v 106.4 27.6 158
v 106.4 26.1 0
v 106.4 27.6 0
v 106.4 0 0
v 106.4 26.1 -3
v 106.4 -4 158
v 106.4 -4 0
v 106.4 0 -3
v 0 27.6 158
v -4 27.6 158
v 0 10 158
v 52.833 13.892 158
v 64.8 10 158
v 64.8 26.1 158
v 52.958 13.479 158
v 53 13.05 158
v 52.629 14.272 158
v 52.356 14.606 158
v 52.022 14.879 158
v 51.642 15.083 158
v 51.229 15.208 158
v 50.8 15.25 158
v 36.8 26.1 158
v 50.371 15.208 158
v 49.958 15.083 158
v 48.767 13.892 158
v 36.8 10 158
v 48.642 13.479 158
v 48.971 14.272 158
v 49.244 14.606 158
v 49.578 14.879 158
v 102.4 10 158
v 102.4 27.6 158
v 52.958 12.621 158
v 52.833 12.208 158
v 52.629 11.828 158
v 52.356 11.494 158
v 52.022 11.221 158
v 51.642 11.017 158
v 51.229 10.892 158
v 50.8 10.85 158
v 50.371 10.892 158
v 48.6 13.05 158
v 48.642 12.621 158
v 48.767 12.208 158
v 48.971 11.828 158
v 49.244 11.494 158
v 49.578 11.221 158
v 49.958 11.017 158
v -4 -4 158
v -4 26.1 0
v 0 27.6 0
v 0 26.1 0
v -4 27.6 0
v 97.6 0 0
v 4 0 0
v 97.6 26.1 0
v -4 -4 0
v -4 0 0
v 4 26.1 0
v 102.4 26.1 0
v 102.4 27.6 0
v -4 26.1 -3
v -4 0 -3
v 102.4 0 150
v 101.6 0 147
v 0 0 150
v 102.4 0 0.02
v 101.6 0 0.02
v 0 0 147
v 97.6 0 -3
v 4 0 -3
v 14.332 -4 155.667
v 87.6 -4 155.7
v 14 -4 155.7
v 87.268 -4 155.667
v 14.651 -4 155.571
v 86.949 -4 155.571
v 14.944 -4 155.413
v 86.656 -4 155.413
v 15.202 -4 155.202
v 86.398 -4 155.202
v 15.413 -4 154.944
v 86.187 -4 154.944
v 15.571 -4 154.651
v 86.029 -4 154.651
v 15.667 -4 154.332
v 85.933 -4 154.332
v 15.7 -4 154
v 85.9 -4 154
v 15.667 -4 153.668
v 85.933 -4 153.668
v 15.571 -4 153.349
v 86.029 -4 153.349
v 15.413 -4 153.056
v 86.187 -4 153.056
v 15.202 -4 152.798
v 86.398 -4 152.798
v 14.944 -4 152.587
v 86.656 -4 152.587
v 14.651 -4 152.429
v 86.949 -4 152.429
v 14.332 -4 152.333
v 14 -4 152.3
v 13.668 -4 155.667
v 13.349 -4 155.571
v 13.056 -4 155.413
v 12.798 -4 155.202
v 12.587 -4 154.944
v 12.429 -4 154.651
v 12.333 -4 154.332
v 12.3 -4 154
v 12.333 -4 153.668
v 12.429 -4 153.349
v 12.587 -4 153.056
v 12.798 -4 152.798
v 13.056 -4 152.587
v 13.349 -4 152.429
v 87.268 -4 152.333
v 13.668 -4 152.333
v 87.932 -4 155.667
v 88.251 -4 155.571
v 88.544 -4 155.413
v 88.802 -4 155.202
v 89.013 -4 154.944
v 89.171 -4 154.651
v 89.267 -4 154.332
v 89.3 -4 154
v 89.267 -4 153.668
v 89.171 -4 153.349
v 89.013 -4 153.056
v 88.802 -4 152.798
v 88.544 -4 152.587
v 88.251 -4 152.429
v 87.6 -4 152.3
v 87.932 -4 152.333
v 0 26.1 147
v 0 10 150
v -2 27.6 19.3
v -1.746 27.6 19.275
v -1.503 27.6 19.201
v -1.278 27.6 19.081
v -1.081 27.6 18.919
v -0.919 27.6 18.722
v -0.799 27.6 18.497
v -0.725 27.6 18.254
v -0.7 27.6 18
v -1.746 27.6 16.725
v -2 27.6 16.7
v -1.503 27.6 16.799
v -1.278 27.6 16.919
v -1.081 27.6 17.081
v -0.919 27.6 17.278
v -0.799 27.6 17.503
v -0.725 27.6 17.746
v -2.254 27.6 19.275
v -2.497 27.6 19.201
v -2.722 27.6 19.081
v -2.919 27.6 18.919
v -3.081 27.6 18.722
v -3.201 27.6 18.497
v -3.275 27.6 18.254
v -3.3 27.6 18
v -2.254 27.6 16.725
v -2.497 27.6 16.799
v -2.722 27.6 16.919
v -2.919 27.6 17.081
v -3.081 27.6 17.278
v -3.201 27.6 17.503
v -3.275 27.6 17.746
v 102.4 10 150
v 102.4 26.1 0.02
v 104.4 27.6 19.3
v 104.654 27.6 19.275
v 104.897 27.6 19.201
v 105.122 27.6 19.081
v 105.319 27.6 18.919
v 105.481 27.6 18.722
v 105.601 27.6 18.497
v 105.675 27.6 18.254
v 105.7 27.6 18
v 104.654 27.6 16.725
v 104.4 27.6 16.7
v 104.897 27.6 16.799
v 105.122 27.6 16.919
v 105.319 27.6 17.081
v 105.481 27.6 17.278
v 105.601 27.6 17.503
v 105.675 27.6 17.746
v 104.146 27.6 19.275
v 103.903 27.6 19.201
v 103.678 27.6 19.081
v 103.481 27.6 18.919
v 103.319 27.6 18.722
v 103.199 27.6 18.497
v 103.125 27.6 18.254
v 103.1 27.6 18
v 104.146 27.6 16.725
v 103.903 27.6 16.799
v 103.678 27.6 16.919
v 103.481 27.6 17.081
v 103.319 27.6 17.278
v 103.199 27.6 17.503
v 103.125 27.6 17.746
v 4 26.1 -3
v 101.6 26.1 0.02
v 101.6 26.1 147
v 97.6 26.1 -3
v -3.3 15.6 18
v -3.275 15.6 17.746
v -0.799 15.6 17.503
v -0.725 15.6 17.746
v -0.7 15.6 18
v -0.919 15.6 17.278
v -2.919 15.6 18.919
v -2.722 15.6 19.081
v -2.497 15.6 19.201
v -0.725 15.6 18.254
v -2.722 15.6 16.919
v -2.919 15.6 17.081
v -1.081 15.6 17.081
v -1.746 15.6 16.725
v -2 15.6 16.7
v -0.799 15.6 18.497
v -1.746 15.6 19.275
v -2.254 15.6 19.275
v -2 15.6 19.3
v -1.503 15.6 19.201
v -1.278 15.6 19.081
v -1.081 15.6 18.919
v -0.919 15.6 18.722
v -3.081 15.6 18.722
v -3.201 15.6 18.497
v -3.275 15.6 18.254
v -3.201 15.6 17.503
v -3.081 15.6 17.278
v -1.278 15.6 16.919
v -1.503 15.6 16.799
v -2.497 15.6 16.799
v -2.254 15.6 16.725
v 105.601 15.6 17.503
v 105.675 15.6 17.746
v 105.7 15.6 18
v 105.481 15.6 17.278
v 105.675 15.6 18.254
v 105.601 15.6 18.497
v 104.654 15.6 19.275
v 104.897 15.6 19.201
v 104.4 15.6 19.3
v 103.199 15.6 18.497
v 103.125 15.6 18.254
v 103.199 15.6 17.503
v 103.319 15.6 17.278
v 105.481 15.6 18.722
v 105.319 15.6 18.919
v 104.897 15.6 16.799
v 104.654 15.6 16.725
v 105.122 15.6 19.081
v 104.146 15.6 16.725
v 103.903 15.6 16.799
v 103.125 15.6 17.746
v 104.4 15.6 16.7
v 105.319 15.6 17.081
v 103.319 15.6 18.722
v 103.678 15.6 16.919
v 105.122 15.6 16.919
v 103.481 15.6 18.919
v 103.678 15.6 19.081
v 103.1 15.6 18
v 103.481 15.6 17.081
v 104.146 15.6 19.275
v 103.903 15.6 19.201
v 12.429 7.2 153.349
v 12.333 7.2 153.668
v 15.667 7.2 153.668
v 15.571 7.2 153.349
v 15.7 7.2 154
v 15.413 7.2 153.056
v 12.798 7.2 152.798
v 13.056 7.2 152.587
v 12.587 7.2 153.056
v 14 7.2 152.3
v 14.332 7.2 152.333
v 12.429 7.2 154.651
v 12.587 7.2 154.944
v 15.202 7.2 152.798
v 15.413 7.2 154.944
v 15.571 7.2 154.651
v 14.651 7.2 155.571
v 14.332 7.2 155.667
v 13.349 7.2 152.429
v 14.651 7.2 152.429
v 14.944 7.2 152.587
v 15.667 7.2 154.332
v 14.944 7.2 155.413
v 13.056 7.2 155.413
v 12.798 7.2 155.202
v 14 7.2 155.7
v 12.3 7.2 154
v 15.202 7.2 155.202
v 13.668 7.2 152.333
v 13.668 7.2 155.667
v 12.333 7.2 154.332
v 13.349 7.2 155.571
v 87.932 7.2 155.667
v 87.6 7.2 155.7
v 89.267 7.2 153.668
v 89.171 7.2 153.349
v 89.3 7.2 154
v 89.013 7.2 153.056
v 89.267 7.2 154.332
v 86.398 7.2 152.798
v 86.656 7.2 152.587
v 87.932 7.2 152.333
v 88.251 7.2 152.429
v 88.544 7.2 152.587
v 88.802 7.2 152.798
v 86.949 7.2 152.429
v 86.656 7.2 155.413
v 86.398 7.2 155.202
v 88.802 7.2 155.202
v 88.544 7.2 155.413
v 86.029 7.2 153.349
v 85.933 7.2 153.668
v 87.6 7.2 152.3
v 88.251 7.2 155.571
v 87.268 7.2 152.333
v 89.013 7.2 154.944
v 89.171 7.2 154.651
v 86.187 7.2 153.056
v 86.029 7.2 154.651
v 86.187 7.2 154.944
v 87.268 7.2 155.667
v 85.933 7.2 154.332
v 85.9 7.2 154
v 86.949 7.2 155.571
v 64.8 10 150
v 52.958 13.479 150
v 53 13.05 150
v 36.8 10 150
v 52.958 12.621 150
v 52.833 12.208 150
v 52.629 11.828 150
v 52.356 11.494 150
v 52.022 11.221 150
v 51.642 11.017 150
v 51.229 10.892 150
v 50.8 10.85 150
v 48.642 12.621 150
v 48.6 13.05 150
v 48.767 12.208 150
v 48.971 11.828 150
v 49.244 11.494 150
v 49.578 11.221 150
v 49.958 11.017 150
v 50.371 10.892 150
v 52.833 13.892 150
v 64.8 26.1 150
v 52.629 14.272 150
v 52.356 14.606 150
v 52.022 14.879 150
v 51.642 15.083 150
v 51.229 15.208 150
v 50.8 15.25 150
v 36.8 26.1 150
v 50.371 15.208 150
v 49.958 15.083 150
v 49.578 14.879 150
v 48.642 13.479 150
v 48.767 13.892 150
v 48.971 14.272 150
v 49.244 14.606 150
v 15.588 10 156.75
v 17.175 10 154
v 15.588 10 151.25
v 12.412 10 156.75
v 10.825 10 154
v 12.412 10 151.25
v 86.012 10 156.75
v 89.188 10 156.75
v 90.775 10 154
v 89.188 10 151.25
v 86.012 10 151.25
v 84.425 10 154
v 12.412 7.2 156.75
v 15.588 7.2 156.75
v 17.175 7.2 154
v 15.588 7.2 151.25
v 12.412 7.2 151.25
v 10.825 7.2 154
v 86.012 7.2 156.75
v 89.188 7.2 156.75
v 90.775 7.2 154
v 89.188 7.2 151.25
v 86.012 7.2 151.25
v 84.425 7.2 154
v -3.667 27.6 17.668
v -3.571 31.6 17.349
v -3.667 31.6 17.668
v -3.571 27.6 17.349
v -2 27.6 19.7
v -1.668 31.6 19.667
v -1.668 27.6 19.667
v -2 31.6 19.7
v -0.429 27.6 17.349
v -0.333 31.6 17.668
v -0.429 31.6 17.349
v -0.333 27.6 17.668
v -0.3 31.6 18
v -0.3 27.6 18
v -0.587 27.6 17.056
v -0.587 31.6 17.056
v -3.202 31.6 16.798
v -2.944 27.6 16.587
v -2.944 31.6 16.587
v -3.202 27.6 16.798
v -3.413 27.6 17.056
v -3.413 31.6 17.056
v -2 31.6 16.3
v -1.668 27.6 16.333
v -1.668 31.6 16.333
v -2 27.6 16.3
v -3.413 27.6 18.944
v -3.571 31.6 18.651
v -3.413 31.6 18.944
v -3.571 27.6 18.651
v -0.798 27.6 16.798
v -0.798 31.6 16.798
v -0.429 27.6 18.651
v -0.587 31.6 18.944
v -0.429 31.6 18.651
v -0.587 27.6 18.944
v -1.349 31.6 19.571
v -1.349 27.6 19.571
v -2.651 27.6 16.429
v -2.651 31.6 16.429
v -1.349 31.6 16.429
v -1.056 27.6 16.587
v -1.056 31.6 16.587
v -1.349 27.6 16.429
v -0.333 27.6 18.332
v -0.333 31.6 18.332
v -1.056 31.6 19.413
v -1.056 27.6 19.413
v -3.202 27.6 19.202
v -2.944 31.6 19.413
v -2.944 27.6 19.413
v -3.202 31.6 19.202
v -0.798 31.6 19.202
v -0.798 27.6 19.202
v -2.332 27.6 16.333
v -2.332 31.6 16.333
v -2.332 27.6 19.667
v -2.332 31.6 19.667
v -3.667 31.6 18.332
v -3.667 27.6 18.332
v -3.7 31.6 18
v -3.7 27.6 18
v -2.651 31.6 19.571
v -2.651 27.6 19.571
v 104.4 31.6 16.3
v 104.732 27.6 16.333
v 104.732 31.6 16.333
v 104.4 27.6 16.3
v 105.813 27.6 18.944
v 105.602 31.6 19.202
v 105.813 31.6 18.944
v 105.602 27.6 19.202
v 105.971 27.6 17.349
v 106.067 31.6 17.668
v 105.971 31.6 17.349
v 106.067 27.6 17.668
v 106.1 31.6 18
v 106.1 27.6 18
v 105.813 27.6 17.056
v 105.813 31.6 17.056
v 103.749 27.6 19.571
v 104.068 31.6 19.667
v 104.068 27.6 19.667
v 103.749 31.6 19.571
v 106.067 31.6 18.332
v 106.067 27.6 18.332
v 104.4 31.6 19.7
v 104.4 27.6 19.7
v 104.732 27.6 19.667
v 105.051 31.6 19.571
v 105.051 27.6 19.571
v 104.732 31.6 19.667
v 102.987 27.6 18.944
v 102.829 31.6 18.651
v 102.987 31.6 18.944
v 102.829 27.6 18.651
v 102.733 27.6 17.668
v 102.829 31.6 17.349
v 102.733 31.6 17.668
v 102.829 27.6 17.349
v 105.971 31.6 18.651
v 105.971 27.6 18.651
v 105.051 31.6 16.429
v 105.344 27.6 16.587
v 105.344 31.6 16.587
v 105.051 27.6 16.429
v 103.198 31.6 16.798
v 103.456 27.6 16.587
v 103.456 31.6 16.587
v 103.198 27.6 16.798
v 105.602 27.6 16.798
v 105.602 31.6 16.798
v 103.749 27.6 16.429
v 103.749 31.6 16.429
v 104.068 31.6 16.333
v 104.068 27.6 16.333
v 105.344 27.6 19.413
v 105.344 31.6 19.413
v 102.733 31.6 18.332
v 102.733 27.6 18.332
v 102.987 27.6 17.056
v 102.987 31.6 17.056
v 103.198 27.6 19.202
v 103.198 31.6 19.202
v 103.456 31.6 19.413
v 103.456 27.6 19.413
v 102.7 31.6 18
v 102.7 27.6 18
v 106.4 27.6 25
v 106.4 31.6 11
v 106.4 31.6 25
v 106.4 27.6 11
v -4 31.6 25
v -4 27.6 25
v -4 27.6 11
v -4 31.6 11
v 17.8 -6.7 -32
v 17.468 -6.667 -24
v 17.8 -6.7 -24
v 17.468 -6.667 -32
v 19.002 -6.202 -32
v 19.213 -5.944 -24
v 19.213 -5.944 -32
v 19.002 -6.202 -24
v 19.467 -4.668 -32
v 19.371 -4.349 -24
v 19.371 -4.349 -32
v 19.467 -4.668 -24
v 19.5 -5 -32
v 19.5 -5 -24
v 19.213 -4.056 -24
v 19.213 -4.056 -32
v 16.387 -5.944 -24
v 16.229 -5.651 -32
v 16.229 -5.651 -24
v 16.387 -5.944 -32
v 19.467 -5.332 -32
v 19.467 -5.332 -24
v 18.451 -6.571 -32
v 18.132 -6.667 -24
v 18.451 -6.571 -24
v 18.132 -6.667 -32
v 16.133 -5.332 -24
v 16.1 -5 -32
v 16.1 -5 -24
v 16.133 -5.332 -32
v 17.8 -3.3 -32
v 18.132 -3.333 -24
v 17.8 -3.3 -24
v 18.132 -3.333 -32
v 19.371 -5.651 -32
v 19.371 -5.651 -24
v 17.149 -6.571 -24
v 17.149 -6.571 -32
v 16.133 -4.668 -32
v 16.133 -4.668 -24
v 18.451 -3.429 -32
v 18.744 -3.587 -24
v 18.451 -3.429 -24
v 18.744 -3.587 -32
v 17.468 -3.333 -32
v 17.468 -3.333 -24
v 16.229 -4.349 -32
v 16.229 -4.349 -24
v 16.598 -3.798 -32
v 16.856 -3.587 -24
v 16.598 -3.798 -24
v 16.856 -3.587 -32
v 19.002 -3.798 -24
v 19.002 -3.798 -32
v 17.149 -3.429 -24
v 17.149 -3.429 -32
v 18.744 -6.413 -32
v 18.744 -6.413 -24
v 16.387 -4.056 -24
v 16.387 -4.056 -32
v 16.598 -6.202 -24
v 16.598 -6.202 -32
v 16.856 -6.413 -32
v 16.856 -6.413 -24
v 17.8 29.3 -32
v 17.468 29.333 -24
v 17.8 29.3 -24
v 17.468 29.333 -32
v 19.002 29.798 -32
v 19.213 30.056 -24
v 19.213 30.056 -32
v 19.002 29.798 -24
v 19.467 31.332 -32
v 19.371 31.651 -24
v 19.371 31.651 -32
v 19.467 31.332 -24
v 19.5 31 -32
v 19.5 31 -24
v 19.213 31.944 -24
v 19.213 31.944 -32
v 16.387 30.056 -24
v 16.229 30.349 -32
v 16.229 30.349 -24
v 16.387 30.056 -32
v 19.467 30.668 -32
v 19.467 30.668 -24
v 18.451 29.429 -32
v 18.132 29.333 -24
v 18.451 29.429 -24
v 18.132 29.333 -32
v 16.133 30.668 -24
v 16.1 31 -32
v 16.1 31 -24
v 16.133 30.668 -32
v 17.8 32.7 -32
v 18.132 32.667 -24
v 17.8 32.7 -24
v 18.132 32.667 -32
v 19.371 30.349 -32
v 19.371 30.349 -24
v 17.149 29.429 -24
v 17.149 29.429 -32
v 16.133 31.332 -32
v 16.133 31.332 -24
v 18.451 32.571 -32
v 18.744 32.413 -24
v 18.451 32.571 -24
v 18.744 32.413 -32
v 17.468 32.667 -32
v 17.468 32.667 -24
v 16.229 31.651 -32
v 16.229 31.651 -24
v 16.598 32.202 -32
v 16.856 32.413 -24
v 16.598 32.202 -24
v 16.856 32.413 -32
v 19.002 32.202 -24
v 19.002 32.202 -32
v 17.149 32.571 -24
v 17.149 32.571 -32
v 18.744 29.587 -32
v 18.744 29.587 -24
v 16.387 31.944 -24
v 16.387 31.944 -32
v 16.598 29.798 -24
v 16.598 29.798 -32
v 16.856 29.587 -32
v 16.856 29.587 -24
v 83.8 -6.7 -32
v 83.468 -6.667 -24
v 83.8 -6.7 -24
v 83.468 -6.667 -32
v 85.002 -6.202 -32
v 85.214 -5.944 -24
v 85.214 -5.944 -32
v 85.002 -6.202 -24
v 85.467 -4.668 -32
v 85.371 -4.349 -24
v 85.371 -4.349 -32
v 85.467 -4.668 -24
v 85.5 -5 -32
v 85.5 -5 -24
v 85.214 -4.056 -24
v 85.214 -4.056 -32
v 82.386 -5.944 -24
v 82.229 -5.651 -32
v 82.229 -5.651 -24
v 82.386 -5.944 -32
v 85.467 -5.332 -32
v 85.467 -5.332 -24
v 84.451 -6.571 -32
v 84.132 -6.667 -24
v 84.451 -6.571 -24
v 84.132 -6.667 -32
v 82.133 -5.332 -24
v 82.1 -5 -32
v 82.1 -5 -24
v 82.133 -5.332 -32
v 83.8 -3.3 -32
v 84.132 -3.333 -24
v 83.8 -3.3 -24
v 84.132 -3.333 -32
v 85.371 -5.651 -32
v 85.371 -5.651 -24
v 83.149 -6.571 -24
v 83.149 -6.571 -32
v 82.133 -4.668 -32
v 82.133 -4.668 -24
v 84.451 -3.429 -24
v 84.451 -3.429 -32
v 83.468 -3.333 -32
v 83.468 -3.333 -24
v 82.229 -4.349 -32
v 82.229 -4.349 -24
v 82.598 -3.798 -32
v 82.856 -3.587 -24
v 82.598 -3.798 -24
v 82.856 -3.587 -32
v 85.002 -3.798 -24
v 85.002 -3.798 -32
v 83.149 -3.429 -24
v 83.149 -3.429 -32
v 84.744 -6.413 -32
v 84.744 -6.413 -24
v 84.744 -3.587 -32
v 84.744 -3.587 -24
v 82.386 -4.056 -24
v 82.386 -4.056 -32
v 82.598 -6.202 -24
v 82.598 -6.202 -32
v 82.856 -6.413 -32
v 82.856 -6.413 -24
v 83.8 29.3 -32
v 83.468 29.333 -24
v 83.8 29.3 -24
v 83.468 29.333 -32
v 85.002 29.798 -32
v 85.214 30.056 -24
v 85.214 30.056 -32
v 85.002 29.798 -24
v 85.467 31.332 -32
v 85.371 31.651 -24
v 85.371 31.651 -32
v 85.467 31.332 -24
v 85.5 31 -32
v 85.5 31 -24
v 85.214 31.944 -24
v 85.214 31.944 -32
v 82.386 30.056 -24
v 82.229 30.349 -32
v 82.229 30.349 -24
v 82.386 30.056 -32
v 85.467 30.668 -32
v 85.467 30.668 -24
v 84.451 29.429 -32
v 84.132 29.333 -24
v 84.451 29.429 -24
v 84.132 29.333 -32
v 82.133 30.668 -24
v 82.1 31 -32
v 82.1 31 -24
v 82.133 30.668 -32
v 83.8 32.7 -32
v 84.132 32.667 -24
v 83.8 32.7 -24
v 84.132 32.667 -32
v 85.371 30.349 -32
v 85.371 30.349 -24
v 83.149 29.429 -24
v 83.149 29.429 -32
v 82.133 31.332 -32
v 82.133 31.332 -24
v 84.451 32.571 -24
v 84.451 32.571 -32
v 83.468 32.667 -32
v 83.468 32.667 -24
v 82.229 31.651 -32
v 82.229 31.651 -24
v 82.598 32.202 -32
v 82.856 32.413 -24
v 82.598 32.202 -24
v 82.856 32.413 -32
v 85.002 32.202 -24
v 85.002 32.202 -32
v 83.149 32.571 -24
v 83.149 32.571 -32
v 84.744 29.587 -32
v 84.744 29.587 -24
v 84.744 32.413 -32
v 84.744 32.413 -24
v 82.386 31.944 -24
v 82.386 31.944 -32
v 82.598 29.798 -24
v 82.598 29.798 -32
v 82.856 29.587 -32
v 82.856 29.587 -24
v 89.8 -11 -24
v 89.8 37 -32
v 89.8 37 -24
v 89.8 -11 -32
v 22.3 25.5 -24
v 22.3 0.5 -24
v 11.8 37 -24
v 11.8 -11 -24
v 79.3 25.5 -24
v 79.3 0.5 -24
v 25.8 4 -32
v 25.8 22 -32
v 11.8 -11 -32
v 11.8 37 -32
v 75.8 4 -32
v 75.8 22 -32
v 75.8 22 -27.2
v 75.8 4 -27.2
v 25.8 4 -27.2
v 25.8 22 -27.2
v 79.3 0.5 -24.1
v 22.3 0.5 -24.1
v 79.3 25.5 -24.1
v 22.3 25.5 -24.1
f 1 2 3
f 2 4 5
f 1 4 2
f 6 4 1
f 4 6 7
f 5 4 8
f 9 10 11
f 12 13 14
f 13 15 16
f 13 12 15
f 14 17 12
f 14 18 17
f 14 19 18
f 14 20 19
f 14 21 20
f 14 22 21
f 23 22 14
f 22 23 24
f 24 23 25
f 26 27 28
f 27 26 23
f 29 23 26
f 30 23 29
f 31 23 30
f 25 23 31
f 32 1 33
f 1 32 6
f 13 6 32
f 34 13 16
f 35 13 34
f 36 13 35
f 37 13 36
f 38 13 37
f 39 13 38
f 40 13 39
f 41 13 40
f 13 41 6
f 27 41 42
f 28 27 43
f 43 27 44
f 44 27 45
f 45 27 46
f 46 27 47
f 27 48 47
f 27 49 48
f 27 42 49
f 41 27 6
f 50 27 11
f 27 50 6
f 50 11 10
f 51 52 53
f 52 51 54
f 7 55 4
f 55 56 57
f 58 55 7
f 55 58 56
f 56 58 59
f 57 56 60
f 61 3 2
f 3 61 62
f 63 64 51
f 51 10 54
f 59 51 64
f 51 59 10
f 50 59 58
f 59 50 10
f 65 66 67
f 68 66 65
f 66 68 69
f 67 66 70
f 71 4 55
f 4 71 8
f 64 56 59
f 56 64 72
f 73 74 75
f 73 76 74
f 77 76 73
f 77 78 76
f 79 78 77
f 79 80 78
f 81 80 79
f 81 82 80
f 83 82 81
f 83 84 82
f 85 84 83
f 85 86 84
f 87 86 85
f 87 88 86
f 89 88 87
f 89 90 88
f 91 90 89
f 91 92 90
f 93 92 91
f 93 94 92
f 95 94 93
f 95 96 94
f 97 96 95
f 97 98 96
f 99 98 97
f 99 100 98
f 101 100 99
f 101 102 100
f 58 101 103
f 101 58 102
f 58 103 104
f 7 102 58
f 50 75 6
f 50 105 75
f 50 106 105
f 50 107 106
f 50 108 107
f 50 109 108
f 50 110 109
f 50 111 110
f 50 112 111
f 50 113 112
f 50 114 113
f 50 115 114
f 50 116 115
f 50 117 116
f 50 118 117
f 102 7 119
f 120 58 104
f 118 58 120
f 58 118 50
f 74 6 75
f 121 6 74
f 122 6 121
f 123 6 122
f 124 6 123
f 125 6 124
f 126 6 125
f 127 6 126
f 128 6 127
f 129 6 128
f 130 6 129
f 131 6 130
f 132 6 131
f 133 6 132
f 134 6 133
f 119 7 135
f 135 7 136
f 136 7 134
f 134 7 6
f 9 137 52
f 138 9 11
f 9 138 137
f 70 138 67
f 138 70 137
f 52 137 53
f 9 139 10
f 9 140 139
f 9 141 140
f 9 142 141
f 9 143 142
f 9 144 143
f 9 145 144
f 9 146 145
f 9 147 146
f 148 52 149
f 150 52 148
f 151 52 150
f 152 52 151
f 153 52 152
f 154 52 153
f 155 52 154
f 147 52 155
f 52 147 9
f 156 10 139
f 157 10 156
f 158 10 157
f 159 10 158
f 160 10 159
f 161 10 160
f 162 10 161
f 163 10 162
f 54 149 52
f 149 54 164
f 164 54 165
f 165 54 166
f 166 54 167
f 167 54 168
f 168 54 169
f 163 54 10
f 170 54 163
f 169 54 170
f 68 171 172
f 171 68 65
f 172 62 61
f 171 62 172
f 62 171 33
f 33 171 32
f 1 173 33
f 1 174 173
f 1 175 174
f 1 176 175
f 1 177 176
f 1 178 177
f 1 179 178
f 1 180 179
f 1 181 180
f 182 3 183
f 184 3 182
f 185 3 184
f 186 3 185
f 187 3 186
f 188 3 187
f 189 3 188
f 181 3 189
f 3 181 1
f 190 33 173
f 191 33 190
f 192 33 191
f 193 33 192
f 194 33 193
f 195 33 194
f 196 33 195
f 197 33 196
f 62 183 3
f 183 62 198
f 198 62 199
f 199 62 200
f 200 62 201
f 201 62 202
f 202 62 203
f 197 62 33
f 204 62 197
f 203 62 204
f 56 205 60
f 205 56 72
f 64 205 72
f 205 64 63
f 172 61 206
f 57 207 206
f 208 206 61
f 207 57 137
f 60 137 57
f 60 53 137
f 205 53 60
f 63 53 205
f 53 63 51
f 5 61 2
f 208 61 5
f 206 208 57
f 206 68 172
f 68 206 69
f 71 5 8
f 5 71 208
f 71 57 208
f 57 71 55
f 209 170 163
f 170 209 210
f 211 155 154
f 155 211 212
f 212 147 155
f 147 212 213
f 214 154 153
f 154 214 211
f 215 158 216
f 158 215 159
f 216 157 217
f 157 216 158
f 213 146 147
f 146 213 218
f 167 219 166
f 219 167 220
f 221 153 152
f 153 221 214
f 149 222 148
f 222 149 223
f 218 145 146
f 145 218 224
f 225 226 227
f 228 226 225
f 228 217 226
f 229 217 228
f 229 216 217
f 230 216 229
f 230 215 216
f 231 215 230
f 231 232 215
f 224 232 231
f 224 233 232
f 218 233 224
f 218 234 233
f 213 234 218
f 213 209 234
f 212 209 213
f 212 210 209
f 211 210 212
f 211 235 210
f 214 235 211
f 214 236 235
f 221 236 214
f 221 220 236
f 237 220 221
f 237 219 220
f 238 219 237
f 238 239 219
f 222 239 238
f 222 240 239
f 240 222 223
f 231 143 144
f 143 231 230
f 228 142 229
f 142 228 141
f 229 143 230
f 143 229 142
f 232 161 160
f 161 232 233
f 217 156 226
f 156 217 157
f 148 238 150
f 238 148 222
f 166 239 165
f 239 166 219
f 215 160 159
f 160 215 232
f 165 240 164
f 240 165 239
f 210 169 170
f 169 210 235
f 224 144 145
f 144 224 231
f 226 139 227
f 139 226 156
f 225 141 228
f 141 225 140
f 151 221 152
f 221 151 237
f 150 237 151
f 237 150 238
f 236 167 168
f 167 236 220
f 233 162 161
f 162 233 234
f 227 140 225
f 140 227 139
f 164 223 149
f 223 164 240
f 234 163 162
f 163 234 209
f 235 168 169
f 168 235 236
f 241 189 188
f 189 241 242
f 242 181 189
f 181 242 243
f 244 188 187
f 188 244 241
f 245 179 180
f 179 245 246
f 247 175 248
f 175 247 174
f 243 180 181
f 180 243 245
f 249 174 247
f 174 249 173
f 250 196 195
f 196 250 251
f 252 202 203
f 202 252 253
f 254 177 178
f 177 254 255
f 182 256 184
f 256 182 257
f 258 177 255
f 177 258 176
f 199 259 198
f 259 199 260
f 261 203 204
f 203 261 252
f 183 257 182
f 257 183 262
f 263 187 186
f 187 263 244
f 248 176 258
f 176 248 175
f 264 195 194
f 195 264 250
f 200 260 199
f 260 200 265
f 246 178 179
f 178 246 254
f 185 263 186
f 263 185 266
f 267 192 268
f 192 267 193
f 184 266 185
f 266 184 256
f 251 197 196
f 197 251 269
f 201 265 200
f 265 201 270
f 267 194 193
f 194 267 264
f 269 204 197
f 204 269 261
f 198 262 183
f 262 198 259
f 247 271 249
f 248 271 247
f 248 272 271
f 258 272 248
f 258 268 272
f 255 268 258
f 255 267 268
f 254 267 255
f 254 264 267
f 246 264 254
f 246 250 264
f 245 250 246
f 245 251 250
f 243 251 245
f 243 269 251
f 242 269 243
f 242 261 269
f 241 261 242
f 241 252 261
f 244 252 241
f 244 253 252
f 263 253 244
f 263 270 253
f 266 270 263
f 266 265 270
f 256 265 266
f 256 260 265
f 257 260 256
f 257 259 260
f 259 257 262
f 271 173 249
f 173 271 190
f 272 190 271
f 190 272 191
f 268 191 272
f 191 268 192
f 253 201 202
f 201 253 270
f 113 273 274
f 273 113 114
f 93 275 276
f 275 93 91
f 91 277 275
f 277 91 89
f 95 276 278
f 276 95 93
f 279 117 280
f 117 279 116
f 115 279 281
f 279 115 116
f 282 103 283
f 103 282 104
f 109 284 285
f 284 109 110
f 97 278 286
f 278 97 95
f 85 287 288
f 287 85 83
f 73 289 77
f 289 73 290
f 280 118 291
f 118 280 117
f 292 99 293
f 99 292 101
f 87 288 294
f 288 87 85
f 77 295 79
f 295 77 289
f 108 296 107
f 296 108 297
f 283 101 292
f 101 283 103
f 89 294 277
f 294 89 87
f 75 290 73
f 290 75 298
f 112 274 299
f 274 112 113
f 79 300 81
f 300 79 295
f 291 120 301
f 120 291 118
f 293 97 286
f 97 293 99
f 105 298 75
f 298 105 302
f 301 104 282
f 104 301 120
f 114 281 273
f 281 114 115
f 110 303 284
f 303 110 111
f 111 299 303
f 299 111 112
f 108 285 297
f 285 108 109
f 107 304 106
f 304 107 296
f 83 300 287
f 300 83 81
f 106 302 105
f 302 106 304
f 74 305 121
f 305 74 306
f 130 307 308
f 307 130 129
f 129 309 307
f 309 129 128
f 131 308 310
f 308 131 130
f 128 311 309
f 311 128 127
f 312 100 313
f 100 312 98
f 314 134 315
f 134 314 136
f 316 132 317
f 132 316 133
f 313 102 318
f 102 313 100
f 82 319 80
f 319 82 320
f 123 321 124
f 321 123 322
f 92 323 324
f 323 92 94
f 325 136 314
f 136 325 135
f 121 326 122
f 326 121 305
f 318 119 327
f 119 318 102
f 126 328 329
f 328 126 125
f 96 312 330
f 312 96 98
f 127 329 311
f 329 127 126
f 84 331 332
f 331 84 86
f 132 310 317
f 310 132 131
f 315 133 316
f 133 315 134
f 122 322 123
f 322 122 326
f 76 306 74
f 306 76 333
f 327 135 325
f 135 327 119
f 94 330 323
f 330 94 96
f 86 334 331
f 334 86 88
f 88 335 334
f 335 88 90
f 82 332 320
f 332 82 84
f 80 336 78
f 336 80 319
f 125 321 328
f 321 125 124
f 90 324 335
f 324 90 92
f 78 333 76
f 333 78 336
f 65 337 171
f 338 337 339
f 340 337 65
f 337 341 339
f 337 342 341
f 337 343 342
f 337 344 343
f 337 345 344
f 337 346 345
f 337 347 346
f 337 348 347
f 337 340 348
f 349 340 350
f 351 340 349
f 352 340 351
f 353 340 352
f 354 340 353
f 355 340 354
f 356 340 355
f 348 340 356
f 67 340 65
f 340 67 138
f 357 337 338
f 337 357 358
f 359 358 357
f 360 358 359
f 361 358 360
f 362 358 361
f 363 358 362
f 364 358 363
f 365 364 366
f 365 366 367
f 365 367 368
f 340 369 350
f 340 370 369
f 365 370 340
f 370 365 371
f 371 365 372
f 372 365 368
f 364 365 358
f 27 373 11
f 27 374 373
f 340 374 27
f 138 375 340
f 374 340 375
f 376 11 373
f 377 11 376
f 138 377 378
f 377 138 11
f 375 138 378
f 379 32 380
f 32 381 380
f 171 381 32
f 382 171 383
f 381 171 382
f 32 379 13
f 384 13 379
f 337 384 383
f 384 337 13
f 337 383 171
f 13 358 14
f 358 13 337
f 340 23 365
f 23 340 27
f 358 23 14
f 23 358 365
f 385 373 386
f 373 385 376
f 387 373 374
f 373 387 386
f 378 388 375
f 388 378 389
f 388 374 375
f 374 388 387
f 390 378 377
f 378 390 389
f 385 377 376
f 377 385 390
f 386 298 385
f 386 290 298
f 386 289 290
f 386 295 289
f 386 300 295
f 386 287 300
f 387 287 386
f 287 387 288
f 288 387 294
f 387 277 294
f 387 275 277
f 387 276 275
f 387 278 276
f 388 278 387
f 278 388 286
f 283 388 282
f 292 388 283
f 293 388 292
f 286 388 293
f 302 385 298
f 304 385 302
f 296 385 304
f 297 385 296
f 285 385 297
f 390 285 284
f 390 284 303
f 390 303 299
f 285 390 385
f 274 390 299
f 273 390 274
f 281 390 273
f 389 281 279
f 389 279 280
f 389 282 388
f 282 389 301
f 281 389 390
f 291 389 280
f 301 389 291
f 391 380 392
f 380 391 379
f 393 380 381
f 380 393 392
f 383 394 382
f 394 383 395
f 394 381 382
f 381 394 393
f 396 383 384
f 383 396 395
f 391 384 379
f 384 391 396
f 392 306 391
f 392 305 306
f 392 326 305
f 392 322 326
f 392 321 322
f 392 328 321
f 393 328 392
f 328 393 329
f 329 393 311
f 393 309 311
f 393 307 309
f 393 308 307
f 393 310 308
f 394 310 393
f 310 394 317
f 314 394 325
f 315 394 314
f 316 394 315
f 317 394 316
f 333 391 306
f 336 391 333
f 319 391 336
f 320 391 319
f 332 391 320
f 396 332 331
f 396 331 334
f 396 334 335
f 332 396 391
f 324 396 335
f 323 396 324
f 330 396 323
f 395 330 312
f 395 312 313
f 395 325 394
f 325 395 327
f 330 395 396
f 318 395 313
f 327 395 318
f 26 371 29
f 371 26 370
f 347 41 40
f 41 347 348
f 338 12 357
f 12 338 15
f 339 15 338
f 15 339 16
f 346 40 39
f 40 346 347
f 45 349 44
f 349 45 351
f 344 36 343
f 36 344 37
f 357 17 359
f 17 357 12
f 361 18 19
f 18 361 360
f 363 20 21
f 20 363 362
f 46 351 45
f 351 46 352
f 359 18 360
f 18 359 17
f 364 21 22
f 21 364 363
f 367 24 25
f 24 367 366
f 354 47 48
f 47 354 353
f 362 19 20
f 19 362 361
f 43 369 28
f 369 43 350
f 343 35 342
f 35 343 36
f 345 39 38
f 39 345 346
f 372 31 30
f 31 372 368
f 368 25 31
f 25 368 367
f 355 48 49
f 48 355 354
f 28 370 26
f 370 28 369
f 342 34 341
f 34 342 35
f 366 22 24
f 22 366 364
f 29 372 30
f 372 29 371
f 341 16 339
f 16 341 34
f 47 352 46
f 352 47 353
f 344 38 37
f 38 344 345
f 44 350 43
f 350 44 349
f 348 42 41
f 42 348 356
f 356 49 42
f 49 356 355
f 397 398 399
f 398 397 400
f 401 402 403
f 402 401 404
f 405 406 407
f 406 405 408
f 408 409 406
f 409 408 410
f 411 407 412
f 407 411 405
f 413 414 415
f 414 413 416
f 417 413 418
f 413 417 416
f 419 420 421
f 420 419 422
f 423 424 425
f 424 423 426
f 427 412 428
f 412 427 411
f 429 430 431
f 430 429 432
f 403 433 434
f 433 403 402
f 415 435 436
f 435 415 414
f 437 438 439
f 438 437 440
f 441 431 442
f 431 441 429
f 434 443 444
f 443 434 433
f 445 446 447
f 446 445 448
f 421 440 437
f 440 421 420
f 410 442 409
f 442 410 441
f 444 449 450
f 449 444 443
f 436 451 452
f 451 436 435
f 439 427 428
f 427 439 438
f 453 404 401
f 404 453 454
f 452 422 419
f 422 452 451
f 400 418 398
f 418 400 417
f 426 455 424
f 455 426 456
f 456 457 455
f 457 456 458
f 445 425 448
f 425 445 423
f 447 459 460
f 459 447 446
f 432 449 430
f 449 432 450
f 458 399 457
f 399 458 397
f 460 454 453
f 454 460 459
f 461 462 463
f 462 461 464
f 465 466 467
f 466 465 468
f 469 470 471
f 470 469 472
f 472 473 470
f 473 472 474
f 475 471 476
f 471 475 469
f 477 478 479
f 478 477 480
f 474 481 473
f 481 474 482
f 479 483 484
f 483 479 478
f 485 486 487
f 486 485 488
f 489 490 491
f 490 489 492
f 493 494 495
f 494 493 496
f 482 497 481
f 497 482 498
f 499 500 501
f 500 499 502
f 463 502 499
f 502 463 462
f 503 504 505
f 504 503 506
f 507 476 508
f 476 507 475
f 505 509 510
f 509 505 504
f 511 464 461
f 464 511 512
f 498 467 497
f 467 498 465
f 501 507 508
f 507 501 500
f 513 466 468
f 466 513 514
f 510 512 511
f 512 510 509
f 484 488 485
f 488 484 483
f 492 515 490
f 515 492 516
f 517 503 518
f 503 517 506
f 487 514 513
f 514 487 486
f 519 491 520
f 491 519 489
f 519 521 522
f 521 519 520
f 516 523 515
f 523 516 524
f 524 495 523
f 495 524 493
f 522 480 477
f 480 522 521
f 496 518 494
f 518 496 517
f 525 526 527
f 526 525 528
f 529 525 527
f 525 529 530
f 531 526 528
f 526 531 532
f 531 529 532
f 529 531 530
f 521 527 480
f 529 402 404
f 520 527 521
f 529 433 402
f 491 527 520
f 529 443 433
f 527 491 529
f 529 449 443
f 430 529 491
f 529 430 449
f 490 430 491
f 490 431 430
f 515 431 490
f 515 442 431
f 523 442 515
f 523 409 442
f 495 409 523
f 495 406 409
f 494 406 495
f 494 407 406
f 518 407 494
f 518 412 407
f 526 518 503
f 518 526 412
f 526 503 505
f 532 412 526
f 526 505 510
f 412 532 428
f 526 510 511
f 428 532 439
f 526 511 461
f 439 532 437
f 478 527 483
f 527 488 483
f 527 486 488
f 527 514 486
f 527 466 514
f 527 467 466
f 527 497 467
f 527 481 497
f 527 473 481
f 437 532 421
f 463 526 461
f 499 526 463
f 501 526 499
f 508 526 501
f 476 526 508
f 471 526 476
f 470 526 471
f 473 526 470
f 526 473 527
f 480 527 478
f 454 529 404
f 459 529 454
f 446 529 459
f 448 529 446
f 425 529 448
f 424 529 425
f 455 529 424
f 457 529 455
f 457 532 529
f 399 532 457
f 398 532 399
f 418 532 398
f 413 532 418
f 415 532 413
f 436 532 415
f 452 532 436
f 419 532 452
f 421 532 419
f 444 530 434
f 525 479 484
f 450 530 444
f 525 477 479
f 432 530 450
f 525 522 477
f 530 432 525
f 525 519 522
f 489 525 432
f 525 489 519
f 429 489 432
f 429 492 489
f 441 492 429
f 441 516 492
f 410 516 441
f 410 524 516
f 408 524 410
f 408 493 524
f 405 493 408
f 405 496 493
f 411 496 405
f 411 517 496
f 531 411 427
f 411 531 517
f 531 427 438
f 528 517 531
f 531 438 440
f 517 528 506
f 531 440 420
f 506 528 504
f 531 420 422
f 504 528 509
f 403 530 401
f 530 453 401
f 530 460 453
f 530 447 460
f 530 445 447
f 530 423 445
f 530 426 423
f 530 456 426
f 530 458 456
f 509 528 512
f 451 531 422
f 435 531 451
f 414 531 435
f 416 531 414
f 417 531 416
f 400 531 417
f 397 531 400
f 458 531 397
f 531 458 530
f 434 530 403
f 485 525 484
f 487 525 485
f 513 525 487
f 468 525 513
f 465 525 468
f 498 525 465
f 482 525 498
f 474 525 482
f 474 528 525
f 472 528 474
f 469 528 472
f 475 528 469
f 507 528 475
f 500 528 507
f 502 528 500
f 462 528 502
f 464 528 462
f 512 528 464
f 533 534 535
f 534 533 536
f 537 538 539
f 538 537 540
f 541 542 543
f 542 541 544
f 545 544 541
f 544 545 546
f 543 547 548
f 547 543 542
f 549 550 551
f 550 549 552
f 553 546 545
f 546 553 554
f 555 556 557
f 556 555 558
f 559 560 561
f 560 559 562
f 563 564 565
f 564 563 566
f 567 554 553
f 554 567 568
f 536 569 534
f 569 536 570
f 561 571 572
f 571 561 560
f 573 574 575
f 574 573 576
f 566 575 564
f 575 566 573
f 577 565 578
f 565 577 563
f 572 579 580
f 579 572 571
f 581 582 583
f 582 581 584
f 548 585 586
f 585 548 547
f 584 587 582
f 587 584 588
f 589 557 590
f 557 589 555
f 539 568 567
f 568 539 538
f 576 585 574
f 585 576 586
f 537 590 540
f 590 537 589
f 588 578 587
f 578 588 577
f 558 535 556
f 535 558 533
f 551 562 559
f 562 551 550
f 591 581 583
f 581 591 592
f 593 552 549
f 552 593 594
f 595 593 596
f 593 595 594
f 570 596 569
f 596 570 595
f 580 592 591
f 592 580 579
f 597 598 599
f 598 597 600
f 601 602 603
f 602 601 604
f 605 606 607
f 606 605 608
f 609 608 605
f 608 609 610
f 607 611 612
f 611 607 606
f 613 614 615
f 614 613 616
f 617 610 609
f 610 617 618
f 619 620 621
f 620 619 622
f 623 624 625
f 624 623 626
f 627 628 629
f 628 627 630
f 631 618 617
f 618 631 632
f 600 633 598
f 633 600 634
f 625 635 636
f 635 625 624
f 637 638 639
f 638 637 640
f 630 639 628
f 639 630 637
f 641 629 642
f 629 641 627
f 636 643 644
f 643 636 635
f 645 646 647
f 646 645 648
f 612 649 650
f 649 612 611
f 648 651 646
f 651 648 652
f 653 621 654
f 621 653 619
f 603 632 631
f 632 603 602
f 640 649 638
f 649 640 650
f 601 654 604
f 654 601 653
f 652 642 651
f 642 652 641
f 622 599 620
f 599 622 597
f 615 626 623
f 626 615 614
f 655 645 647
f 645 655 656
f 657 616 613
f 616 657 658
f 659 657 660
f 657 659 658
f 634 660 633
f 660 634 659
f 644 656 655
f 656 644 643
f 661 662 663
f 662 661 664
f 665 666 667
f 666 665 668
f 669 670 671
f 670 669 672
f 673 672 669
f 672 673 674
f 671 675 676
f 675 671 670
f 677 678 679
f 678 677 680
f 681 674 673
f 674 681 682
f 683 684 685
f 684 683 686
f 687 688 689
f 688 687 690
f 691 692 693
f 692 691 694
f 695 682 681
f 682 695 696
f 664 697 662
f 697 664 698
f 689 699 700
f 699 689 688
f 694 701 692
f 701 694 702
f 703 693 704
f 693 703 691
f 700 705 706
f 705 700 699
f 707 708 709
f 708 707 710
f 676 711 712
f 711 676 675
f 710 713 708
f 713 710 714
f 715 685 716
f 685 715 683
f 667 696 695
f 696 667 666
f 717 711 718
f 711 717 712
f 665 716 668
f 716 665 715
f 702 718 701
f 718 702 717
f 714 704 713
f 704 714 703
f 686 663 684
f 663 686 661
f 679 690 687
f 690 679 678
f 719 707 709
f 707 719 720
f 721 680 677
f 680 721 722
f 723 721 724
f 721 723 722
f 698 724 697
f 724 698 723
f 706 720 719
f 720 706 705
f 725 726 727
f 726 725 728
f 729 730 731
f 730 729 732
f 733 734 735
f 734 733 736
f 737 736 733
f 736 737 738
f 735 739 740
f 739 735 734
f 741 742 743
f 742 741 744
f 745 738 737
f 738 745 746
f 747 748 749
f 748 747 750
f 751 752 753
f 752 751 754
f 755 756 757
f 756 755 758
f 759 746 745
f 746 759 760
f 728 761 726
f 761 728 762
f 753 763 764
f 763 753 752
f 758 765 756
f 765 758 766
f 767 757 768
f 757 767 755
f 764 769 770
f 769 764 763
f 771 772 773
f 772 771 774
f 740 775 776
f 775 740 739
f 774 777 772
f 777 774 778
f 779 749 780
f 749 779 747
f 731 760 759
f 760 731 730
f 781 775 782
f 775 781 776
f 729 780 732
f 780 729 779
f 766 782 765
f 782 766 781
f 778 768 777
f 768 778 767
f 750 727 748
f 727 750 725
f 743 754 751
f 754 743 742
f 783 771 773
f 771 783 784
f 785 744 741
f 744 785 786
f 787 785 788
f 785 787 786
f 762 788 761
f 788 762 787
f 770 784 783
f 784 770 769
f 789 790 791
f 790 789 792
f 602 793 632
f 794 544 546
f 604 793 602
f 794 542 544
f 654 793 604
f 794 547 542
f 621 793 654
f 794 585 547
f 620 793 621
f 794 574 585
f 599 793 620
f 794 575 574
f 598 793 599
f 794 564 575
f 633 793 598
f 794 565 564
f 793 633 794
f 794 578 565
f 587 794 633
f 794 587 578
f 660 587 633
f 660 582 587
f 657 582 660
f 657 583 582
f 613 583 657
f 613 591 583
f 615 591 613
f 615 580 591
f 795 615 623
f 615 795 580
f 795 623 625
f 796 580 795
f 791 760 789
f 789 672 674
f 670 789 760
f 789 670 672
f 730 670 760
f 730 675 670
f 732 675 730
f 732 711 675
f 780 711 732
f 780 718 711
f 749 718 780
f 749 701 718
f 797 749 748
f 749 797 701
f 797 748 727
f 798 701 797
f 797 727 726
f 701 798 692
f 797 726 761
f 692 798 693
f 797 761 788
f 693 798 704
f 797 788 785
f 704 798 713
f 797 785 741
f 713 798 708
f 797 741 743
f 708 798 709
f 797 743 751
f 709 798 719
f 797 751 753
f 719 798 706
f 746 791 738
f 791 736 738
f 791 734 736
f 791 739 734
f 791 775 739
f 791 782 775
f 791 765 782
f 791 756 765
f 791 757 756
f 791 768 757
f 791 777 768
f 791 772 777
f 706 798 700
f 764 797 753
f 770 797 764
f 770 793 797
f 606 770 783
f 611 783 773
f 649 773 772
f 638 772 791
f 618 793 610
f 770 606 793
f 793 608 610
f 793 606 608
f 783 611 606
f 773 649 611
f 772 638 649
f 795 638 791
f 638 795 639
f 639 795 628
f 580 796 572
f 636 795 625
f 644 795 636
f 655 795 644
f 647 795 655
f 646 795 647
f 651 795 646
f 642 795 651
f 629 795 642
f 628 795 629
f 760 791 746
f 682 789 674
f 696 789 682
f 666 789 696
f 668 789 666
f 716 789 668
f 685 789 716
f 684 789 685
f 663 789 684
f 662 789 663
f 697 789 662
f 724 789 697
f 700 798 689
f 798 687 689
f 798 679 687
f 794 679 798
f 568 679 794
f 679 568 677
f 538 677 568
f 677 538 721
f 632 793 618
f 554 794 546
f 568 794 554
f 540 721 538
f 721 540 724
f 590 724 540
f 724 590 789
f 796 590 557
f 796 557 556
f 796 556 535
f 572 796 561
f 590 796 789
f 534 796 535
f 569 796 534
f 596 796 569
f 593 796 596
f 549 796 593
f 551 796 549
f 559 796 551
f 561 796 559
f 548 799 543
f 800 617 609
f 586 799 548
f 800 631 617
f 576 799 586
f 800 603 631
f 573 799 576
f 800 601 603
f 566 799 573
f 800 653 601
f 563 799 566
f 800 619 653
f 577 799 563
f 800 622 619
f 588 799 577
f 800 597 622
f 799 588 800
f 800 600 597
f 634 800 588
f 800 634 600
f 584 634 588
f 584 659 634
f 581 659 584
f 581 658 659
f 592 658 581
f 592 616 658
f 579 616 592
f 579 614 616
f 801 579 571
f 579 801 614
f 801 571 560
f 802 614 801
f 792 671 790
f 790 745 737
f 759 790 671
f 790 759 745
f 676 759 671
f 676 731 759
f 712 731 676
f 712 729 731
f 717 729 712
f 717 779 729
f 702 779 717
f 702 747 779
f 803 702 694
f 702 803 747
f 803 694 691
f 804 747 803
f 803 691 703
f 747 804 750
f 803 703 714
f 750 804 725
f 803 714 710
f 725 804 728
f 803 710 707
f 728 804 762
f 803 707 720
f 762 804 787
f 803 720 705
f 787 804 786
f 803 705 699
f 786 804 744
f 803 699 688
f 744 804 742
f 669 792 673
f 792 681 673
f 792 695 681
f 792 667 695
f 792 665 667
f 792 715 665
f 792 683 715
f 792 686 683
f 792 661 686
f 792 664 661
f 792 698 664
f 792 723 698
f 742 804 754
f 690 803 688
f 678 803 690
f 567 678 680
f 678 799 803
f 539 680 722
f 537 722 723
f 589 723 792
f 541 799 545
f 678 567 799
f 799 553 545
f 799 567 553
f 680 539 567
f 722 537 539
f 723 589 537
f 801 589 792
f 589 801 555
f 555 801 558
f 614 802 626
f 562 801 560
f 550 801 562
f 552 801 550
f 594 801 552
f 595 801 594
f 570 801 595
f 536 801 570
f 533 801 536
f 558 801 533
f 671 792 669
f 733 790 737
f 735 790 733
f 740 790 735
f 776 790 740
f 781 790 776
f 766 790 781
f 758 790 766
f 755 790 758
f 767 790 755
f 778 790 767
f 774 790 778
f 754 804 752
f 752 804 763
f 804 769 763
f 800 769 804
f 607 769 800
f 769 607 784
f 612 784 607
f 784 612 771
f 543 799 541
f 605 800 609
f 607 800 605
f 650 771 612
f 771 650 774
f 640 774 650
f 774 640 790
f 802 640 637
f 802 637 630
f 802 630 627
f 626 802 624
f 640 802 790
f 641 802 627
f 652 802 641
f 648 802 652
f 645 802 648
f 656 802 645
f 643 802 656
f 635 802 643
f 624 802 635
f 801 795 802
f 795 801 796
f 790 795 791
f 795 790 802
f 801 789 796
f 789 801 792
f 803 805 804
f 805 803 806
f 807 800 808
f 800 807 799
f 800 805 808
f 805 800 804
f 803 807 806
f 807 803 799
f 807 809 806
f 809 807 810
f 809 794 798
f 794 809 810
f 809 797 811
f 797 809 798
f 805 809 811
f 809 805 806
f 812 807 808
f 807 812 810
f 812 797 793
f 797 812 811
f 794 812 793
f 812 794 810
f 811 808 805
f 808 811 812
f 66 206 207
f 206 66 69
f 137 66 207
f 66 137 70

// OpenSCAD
// file: lib.scad
include <params.scad>

// Цилиндр гайки M3. Ось цилиндра — Z вызывающего модуля.
module m3_nut() {
    cylinder(h = m3_nut_t, d = m3_nut_af / cos(30), $fn = 6);
}
// file: sled.scad
// Жёсткие салазки под покупной разъём SATA. Окно по центру — черновик,
// его двигать после калибра. Фаска смотрит на диск (+Z в сборке).
// Четыре отверстия M3 — к будущей каретке. Это примерка руками, не слепой стык.

include <params.scad>

module sled() {
    wx = (sled_w - sled_window_w) / 2;
    wy = (sled_h - sled_window_h) / 2;
    difference() {
        cube([sled_w, sled_h, sled_t]);
        translate([wx, wy, -0.1])
            cube([sled_window_w, sled_window_h, sled_t + 0.2]);
        hull() {
            translate([wx, wy, sled_t - 3.2])
                cube([sled_window_w, sled_window_h, 0.1]);
            translate([wx - 3.5, wy - 3.5, sled_t - 0.1])
                cube([sled_window_w + 7, sled_window_h + 7, 0.1]);
        }
        for (x = [sled_hole_inset, sled_w - sled_hole_inset]) {
            for (y = [sled_hole_inset, sled_h - sled_hole_inset]) {
                translate([x, y, -0.1])
                    cylinder(h = sled_t + 0.2, d = m3_clear);
            }
        }
    }
}

sled();
// file: strap.scad
// Планка сверху у задней части отсека, чтобы диск не подпрыгивал.
// Садится на торцы боковых стенок. Печать — отверстиями вверх.

include <params.scad>

module strap_body() {
    difference() {
        cube([outer_w, strap_t, strap_foot]);
        for (x = [wall / 2, outer_w - wall / 2]) {
            translate([x, -0.1, strap_foot / 2])
                rotate([-90, 0, 0])
                    cylinder(h = strap_t + 0.2, d = m3_clear);
        }
    }
}

translate([0, strap_foot, 0])
    rotate([90, 0, 0])
        strap_body();
// file: front_plate.scad
// Передний упор. Винт M4 вдоль Z поджимает диск к задним уголкам.
// Два винта M3 снизу держат пластину на полу отсека, гайки сверху низкой полки.
// Файл кладёт деталь гайками вверх.

include <lib.scad>

module front_plate_body() {
    difference() {
        union() {
            cube([cavity_w, plate_bar_h, plate_t]);
            translate([tower_x, 0, 0])
                cube([tower_w, drive_height, plate_t]);
        }
        for (x = plate_screw_x) {
            translate([x, -0.1, plate_t / 2])
                rotate([-90, 0, 0])
                    cylinder(h = plate_bar_h + 0.2, d = m3_clear);
            translate([x, plate_bar_h - m3_nut_t, plate_t / 2])
                rotate([-90, 0, 0])
                    m3_nut();
        }
        translate([drive_width / 2, drive_height / 2, -0.1])
            cylinder(h = plate_t + 0.2, d = pusher_d);
    }
}

// +Y корпуса (гайка) становится +Z принтера.
translate([0, plate_t, 0])
    rotate([90, 0, 0])
        front_plate_body();
// file: bay.scad
// Отсек одного диска 3.5".
// X = 0 у борта-упора, Y = 0 на полу, Z = 0 на задней плоскости диска, +Z к передней.
// Задняя сторона открыта: разъём приезжает с −Z. Уголки задают заднюю плоскость,
// передний винт поджимает диск к ним.

include <params.scad>

module bay() {
    difference() {
        union() {
            translate([-wall, -floor_t, 0])
                cube([outer_w, floor_t, body_z]);
            translate([-wall, -floor_t, 0])
                cube([wall, floor_t + wall_h, body_z]);
            translate([cavity_w, -floor_t, 0])
                cube([wall, floor_t + wall_h, body_z]);
            // Уголок на всю высоту печатается вместе со стеной. 4 мм от борта —
            // ставка, что разъём дальше; это проверяет калибр.
            translate([-wall, 0, -lip_t])
                cube([wall + nib, drive_height, lip_t + 0.02]);
            translate([drive_width - nib, 0, -lip_t])
                cube([nib + side_clearance + wall, drive_height, lip_t + 0.02]);
        }
        for (x = [-wall / 2, cavity_w + wall / 2]) {
            translate([x, wall_h - 12, strap_z])
                rotate([-90, 0, 0])
                    cylinder(h = 14, d = m3_pilot);
        }
        for (x = plate_screw_x) {
            translate([x, -floor_t - 0.1, plate_screw_z])
                rotate([-90, 0, 0])
                    cylinder(h = floor_t + 0.2, d = m3_clear);
        }
    }
}

bay();
// file: params.scad
// Общие размеры первой итерации: один отсек 3.5" и детали вокруг него.
// Корпус диска — SFF-8301, таблица 3-1, класс высоты 26.10 мм (максимум).
// Положение разъёма SATA сюда не зашито: его снимают калибром gauge.scad
// с конкретного диска и только потом переносят в окно салазок.

drive_width = 101.60;
drive_height = 26.10;
drive_length = 147.00;

wall = 4.0;
floor_t = 4.0;
lip_t = 3.0;
nib = 4.0;
side_clearance = 0.8;
top_clearance = 1.5;

front_gap = 3.0;
plate_t = 8.0;
front_extra = front_gap + plate_t;

pusher_d = 4.4;
m3_clear = 3.4;
m3_pilot = 2.6;
m3_nut_af = 5.5;
m3_nut_t = 2.8;

cavity_w = drive_width + side_clearance;
outer_w = cavity_w + 2 * wall;
wall_h = drive_height + top_clearance;
body_z = drive_length + front_extra;

strap_z = 18;
strap_t = 4.0;
strap_foot = 14.0;

plate_screw_x = [14, drive_width - 14];
plate_z0 = drive_length + front_gap;
plate_screw_z = plate_z0 + plate_t / 2;
plate_bar_h = 10;
tower_w = 28;
tower_x = drive_width / 2 - tower_w / 2;

sled_w = 78;
sled_h = 48;
sled_t = 8;
sled_window_w = 50;
sled_window_h = 18;
sled_hole_inset = 6;

$fn = 32;
// main file
// Сборка первой примерки: отсек, упор, планка, диск и салазки с зазором.
// Салазки не доведены до диска специально.

include <params.scad>
use <bay.scad>
use <front_plate.scad>
use <strap.scad>
use <sled.scad>

color([0.76, 0.73, 0.66])
    bay();

color([0.38, 0.56, 0.74])
    translate([0, 0, plate_z0])
        front_plate_body();

color([0.42, 0.62, 0.38])
    translate([-wall, wall_h, strap_z - strap_foot / 2])
        strap_body();

color([0.84, 0.46, 0.24])
    translate([drive_width / 2 - sled_w / 2, -11, -24 - sled_t])
        sled();

color([0.16, 0.17, 0.19, 0.55])
    cube([drive_width, drive_height, drive_length]);
